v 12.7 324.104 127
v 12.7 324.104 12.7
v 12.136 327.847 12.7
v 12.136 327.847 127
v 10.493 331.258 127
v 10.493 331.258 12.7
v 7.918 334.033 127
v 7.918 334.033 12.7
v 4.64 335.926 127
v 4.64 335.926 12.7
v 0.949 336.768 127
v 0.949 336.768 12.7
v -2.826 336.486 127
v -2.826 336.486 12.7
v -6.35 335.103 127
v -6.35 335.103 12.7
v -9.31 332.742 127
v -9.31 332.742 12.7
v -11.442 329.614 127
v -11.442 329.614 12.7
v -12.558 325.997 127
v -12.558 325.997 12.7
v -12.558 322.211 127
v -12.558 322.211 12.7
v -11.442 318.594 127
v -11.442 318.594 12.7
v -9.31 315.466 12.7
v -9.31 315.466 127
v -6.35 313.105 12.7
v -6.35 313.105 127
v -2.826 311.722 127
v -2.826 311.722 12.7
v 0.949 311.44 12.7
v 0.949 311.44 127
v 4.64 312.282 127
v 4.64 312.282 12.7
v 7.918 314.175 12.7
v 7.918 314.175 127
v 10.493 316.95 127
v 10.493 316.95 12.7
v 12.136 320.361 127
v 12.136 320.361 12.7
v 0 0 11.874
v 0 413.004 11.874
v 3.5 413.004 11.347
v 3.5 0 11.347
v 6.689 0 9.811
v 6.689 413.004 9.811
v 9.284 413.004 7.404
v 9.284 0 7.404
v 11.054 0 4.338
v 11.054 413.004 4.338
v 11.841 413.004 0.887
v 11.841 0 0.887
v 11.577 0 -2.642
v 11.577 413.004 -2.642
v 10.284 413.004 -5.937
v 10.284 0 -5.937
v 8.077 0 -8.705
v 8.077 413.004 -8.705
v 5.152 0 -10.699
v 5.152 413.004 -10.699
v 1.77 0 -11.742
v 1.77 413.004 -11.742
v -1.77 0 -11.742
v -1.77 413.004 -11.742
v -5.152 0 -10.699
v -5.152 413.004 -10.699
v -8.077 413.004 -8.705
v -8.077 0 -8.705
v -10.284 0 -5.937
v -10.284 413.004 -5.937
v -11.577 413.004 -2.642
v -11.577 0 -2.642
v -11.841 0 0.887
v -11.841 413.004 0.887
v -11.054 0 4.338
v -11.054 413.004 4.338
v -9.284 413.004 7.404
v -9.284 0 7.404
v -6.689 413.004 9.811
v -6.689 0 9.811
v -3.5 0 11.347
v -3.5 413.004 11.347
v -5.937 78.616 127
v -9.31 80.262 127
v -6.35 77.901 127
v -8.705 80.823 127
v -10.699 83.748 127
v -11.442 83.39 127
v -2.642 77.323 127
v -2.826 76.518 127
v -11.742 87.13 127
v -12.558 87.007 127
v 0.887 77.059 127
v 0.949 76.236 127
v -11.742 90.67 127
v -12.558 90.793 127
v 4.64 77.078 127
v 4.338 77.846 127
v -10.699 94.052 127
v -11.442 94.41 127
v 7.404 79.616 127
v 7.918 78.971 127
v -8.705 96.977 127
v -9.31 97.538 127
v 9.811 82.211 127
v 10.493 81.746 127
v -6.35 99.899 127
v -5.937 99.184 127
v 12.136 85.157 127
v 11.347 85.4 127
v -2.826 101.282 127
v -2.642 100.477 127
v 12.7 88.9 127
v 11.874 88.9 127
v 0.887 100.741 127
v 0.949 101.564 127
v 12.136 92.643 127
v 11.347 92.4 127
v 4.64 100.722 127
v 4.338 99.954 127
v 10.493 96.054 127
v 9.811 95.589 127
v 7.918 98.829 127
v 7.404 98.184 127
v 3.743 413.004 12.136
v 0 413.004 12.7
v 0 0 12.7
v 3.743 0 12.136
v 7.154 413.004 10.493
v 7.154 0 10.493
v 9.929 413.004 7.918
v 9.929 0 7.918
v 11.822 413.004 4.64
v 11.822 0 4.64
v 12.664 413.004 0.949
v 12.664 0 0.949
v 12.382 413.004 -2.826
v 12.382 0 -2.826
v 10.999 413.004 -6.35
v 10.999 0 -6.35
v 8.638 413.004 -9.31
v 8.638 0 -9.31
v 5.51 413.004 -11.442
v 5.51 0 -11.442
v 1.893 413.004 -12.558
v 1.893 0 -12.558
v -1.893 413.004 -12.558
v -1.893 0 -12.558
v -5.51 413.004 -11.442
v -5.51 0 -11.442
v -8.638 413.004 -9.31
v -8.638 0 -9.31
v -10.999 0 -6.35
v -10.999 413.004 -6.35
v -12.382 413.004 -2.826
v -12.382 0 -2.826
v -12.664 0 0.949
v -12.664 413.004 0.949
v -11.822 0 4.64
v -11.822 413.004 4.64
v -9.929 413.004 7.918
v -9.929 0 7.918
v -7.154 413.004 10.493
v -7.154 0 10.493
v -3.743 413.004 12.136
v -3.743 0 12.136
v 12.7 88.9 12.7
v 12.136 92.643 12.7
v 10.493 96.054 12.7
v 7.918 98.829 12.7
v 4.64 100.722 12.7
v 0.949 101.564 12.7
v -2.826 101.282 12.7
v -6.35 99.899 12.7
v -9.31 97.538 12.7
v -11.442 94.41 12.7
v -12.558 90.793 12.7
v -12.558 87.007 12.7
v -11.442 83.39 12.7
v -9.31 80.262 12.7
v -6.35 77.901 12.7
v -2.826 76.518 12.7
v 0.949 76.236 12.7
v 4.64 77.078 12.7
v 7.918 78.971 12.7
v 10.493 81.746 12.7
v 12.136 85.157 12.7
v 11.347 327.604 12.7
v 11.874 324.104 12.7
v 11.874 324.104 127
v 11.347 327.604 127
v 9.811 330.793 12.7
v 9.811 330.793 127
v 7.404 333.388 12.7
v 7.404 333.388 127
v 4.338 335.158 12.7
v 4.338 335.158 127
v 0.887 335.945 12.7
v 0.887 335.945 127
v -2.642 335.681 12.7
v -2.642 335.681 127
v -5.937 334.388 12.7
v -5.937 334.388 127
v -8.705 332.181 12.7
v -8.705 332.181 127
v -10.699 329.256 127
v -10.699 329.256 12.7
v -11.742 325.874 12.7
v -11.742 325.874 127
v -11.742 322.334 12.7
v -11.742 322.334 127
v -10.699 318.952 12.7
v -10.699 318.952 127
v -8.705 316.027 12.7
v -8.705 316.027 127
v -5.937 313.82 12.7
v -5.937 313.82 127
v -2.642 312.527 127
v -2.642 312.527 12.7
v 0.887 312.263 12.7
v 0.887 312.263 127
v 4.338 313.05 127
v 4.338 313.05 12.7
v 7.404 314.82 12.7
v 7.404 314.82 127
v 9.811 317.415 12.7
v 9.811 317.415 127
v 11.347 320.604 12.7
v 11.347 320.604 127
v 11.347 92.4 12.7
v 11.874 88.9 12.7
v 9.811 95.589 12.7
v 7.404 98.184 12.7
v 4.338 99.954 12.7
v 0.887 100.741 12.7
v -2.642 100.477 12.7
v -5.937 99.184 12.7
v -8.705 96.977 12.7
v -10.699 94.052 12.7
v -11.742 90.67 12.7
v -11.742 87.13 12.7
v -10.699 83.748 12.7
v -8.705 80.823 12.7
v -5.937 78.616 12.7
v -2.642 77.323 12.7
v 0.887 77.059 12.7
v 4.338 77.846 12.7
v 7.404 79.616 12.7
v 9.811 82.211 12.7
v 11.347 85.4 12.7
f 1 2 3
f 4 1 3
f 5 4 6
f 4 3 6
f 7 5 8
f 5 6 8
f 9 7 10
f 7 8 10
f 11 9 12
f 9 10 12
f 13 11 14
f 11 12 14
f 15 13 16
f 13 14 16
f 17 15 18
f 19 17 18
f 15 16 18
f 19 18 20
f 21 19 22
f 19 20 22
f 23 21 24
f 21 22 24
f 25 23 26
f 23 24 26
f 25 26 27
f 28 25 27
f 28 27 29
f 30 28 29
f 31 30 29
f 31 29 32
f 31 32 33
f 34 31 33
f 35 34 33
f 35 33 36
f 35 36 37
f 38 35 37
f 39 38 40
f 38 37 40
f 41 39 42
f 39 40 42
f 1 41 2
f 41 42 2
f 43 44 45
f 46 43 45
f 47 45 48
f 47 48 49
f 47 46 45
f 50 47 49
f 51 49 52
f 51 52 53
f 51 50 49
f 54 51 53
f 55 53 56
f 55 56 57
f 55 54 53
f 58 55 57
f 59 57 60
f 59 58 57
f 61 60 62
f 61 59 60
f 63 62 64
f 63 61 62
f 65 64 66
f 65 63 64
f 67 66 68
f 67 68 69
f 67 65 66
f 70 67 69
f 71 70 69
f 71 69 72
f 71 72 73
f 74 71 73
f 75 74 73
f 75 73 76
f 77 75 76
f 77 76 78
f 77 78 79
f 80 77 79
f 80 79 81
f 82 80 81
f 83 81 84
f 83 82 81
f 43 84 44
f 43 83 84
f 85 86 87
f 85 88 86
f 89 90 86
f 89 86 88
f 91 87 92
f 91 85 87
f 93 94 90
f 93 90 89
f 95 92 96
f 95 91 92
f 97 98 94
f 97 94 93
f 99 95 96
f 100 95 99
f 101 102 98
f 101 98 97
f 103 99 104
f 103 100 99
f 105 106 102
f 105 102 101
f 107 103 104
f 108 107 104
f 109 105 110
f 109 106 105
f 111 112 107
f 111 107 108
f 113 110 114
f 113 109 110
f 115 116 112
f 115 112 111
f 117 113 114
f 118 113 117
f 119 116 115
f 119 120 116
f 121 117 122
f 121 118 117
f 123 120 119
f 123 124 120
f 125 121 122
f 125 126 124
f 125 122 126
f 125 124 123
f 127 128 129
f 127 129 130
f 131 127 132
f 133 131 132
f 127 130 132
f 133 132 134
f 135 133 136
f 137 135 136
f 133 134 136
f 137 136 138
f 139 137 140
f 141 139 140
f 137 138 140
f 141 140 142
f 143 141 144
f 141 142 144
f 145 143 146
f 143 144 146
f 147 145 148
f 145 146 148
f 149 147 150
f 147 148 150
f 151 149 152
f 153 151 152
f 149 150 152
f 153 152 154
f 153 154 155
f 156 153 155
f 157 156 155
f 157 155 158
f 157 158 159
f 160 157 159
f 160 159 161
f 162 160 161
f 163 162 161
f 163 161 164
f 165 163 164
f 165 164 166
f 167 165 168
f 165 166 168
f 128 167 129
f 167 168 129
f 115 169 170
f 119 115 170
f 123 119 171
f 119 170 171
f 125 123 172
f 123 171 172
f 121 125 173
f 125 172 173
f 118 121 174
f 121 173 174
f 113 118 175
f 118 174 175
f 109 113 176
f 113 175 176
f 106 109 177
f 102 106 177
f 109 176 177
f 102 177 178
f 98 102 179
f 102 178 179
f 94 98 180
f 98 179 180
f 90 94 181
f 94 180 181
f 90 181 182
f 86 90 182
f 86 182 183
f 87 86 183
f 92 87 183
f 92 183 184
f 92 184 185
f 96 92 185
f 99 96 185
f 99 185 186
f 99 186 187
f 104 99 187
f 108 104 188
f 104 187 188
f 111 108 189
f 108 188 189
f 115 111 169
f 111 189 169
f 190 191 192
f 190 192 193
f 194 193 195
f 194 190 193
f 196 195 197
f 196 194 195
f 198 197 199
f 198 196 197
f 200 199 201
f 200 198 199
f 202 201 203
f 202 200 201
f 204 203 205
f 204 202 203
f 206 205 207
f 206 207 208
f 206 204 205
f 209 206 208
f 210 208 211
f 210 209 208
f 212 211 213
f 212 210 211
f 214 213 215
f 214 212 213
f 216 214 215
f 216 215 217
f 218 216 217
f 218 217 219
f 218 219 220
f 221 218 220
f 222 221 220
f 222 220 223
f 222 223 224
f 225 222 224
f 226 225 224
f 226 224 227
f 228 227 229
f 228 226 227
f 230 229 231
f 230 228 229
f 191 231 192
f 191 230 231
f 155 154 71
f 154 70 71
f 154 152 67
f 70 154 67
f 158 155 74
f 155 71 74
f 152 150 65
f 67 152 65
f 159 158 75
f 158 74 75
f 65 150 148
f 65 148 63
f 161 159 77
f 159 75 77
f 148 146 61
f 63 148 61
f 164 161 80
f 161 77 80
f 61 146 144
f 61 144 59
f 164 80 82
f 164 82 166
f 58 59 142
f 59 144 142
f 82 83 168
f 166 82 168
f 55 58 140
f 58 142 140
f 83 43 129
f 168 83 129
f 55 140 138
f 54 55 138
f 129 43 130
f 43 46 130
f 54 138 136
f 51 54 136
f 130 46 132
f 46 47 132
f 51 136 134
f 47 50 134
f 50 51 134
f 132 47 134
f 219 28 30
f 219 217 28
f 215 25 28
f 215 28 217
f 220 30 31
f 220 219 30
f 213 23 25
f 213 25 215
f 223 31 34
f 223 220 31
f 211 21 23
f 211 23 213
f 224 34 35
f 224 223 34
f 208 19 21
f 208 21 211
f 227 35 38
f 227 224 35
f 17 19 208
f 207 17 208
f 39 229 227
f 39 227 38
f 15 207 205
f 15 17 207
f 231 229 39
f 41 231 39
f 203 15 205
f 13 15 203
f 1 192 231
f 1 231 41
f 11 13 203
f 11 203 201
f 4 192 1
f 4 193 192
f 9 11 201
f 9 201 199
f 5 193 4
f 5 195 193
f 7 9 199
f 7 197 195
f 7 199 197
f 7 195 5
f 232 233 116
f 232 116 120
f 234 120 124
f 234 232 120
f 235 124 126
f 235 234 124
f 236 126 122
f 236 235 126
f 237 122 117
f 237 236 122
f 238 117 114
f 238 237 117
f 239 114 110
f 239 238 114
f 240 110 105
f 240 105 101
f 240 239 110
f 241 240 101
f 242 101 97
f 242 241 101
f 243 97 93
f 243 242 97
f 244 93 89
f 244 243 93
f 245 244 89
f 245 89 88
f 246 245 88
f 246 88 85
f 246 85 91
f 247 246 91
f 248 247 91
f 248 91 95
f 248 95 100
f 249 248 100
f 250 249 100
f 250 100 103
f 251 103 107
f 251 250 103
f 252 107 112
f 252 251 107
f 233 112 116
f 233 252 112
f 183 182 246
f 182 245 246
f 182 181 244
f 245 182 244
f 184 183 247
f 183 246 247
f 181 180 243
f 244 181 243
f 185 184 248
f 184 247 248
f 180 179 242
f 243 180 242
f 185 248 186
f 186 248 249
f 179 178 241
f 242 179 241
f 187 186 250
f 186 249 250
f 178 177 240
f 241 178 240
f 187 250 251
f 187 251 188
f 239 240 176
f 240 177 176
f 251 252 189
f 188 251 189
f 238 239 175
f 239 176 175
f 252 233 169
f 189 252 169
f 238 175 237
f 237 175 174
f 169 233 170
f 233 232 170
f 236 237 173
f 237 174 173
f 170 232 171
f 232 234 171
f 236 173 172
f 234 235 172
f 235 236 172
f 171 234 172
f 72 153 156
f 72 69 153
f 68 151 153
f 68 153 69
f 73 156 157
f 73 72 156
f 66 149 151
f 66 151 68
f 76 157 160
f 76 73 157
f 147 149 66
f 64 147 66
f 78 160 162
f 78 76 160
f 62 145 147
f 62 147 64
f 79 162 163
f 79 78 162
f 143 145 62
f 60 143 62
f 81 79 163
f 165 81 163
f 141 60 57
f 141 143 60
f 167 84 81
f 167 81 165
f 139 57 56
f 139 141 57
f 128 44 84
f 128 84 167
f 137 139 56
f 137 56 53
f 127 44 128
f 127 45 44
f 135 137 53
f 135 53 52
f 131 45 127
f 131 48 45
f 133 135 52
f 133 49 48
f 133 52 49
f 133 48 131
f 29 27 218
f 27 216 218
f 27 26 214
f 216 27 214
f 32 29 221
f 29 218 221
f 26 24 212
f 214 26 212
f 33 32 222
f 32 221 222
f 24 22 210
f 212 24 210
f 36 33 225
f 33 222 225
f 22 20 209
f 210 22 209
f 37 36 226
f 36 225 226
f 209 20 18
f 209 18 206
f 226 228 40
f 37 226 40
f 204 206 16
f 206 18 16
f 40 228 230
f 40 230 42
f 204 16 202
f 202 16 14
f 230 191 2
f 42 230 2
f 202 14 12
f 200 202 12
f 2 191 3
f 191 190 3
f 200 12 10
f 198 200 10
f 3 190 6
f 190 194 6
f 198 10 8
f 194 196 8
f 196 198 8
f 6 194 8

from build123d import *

# Parameters (mm, degrees)
SKETCH1_R             = 12.7
SKETCH1_R_2           = 11.8745
BOSS_EXTRUDE1_DEPTH   = 413.004
SKETCH2_R             = 12.7
SKETCH2_R_2           = 11.8745
BOSS_EXTRUDE2_DEPTH   = 114.3
BOSS_EXTRUDE2_2_DEPTH = 114.3


with BuildPart() as part:
    # Sketch1 → Boss-Extrude1 (new body)
    with BuildSketch(Plane(origin=(0, 0, 0), x_dir=(1, 0, 0), z_dir=(0, 1, 0))):
        with Locations(Location((0, 0, 0), (0, 0, 270))):
            Circle(SKETCH1_R)
        with Locations(Location((0, 0, 0), (0, 0, 270))):
            Circle(SKETCH1_R_2, mode=Mode.SUBTRACT)
    extrude(amount=BOSS_EXTRUDE1_DEPTH)


with BuildPart() as body_2:
    # Sketch2 → Boss-Extrude2 (new body)
    with BuildSketch(Plane.XY.offset(12.7)):
        with Locations((0, 324.104)):
            Circle(SKETCH2_R)
        with Locations((0, 324.104)):
            Circle(SKETCH2_R_2, mode=Mode.SUBTRACT)
    extrude(amount=BOSS_EXTRUDE2_DEPTH)


with BuildPart() as body_3:
    # Sketch2 → Boss-Extrude2 2 (new body)
    with BuildSketch(Plane.XY.offset(12.7)):
        with Locations((0, 88.9)):
            Circle(SKETCH2_R)
        with Locations((0, 88.9)):
            Circle(SKETCH2_R_2, mode=Mode.SUBTRACT)
    extrude(amount=BOSS_EXTRUDE2_2_DEPTH)


solid = Compound([part.part, body_2.part, body_3.part])
